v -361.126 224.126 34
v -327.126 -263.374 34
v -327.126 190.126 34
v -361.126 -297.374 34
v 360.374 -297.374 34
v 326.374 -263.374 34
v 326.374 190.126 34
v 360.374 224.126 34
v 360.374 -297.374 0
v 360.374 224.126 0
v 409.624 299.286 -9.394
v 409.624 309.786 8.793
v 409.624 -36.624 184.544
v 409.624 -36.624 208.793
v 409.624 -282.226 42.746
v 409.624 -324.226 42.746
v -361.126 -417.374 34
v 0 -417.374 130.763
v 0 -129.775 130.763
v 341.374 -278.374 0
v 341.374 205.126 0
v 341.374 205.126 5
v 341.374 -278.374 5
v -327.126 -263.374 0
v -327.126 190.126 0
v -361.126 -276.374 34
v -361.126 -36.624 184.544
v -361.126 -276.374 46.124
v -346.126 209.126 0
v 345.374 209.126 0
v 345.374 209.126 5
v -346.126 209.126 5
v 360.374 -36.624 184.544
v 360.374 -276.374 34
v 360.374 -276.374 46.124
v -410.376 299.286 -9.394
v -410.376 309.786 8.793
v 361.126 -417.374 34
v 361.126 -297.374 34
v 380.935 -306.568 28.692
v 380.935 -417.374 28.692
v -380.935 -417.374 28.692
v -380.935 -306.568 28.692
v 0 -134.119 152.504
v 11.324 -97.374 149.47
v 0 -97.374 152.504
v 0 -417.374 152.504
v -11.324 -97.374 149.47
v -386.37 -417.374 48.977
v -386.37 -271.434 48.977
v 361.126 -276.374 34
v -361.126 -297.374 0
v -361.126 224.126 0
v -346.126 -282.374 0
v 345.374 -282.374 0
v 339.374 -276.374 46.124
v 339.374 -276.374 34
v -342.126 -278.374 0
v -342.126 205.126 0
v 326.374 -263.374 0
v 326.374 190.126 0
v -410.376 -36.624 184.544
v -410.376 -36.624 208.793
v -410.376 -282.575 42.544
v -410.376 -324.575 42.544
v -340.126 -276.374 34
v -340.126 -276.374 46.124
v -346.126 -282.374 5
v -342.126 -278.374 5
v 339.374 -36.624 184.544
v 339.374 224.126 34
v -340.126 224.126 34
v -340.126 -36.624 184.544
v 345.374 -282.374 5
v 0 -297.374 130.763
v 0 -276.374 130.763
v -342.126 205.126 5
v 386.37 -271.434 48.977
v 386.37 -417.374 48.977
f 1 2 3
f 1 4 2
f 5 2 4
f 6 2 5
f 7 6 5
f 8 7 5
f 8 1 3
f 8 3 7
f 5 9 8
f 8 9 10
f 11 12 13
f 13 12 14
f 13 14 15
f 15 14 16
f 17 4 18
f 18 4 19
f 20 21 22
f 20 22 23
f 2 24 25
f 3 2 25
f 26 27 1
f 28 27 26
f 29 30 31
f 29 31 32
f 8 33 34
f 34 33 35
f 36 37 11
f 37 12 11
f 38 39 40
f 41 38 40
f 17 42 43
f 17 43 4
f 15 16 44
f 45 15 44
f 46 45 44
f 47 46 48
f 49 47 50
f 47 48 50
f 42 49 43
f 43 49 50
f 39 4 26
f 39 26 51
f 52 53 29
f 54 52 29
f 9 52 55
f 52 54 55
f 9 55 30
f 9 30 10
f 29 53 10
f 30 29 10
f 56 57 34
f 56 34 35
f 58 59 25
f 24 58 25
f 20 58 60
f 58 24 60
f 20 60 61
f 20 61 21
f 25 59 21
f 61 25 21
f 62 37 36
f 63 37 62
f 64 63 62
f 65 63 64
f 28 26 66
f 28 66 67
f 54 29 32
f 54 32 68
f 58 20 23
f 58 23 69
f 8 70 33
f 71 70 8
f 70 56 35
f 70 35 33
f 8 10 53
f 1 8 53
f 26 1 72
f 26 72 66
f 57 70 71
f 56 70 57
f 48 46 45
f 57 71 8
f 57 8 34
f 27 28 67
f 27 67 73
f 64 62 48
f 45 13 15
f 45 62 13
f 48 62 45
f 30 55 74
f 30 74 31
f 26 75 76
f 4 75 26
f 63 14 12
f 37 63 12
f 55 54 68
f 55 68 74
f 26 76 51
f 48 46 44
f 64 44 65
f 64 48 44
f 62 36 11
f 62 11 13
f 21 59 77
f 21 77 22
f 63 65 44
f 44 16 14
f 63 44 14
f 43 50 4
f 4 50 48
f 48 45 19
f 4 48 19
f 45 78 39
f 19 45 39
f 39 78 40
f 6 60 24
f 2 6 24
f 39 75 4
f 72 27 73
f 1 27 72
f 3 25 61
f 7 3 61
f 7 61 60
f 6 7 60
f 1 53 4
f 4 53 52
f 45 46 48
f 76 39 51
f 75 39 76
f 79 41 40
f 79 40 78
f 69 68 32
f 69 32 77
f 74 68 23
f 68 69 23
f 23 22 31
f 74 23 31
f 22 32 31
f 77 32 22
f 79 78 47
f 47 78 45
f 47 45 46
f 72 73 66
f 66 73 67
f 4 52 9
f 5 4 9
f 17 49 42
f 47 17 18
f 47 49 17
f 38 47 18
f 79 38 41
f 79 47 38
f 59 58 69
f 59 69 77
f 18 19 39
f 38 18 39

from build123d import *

# Parameters (mm, degrees)
F1_DEPTH       = 34
F3_DEPTH       = 770.75
F3_DEPTH_BACK  = 49.25
F4_DEPTH       = 21
F5_START       = -700.5
F5_DEPTH       = 21
F6_DEPTH       = 5
F8_DEPTH       = 21
F7_W           = 721.5
F7_H           = 34
F9_DEPTH       = 200
F9_DEPTH_BACK  = 50
F10_W          = 820
F10_H          = 41.1768076986
F11_DEPTH      = 50
F11_TAPER      = -3
F12_DEPTH      = 200
F12_DEPTH_BACK = 120
F14_DEPTH      = 300
F16_DEPTH      = 800


with BuildPart() as f1:
    # F0 (on Top) → F1 (new body)
    with BuildSketch(Plane.XY):
        Polygon((345.3741043846, -282.3741084489), (360.3741043846, -297.3741084489), (360.3741043846, 224.1258915511), (345.3741043846, 209.1258915511), align=None)
        Polygon((326.3741043846, -263.3741084489), (341.3741043846, -278.3741084489), (341.3741043846, 205.1258915511), (326.3741043846, 190.1258915511), align=None)
        Polygon((-346.1258956154, -282.3741084489), (-361.1258956154, -297.3741084489), (360.3741043846, -297.3741084489), (345.3741043846, -282.3741084489), align=None)
        Polygon((360.3741043846, 224.1258915511), (-361.1258956154, 224.1258915511), (-346.1258956154, 209.1258915511), (345.3741043846, 209.1258915511), align=None)
        Polygon((-361.1258956154, 224.1258915511), (-361.1258956154, -297.3741084489), (-346.1258956154, -282.3741084489), (-346.1258956154, 209.1258915511), align=None)
        Polygon((-327.1258956154, -263.3741084489), (-342.1258956154, -278.3741084489), (341.3741043846, -278.3741084489), (326.3741043846, -263.3741084489), align=None)
        Polygon((-342.1258956154, 205.1258915511), (-342.1258956154, -278.3741084489), (-327.1258956154, -263.3741084489), (-327.1258956154, 190.1258915511), align=None)
        Polygon((341.3741043846, 205.1258915511), (-342.1258956154, 205.1258915511), (-327.1258956154, 190.1258915511), (326.3741043846, 190.1258915511), align=None)
        Polygon((341.3741043846, -278.3741084489), (345.3741043846, -282.3741084489), (345.3741043846, 209.1258915511), (341.3741043846, 205.1258915511), align=None)
        Polygon((-342.1258956154, -278.3741084489), (-346.1258956154, -282.3741084489), (345.3741043846, -282.3741084489), (341.3741043846, -278.3741084489), align=None)
        Polygon((-346.1258956154, 209.1258915511), (-346.1258956154, -282.3741084489), (-342.1258956154, -278.3741084489), (-342.1258956154, 205.1258915511), align=None)
        Polygon((345.3741043846, 209.1258915511), (-346.1258956154, 209.1258915511), (-342.1258956154, 205.1258915511), (341.3741043846, 205.1258915511), align=None)
    extrude(amount=F1_DEPTH)

    # F0 (on Top) → F6 (cut)
    with BuildSketch(Plane.XY):
        Polygon((345.3741043846, 209.1258915511), (-346.1258956154, 209.1258915511), (-342.1258956154, 205.1258915511), (341.3741043846, 205.1258915511), align=None)
        Polygon((-346.1258956154, 209.1258915511), (-346.1258956154, -282.3741084489), (-342.1258956154, -278.3741084489), (-342.1258956154, 205.1258915511), align=None)
        Polygon((-342.1258956154, -278.3741084489), (-346.1258956154, -282.3741084489), (345.3741043846, -282.3741084489), (341.3741043846, -278.3741084489), align=None)
        Polygon((341.3741043846, -278.3741084489), (345.3741043846, -282.3741084489), (345.3741043846, 209.1258915511), (341.3741043846, 205.1258915511), align=None)
    extrude(amount=F6_DEPTH, mode=Mode.SUBTRACT)


with BuildPart() as f3:
    # F2 (on face) → F3 (new body, two sides)
    with BuildSketch(Plane(origin=(-361.1258956154, 0, 0), x_dir=(0, -1, 0), z_dir=(-1, 0, 0))) as f3_sk:
        Polygon((-224.1258915511, 34), (36.6241084489, 184.5440826912), (36.6241084489, 208.7927939972), (-309.7860530649, 8.7927939972), (-299.2860530649, -9.3937394823), align=None)
        Polygon((36.6241084489, 208.7927939972), (36.6241084489, 184.5440826912), (276.3741084489, 46.124355653), (297.3741084489, 34), (372.5342699626, -9.3937394823), (383.0342699626, 8.7927939972), align=None)
    extrude(amount=-F3_DEPTH)
    extrude(f3_sk.sketch, amount=F3_DEPTH_BACK)

    # F7 (on face) → F9 (cut, two sides)
    with BuildSketch(Plane.XZ.offset(297.3741084489)) as f9_sk:
        Polygon((-361.1258956154, 0), (-361.1258956154, 34), (-380.9351305685, 28.6921314917), (-386.3703305156, 48.9765738437), (-569.1533924811, 0), align=None)
        Polygon((-380.9351305685, 28.6921314917), (-361.1258956154, 34), (0, 130.7633920961), (0, 152.5041918847), (-386.3703305156, 48.9765738437), align=None)
        Polygon((361.1258956154, 34), (360.3741043846, 34), (360.3741043846, 0), (569.1533924811, 0), (386.3703305156, 48.9765738437), (380.9351305685, 28.6921314917), align=None)
        Polygon((0, 152.5041918847), (0, 130.7633920961), (361.1258956154, 34), (380.9351305685, 28.6921314917), (386.3703305156, 48.9765738437), align=None)
        Polygon((0, 130.7633920961), (-361.1258956154, 34), (360.3741043846, 34), (361.1258956154, 34), align=None)
        with Locations((-0.3758956154, 17)):
            Rectangle(F7_W, F7_H)
    extrude(amount=-F9_DEPTH, mode=Mode.SUBTRACT)
    extrude(f9_sk.sketch, amount=F9_DEPTH_BACK, mode=Mode.SUBTRACT)

    # F10 (on face) → F11 (cut)
    with BuildSketch(Plane(origin=(0, -99.5659589765, 172.4532996517), x_dir=(1, 0, 0), z_dir=(0, -0.5, 0.8660254038))):
        Polygon((409.6241043846, -259.4151114743), (0, -39.8982155339), (-410.3758956154, -259.8179951806), (-612.6573998522, -368.2203265886), (612.6573998522, -368.2203265886), align=None)
        with Locations((-0.3758956154, -306.7326074598)):
            Rectangle(F10_W, F10_H, mode=Mode.SUBTRACT)
        with Locations((-0.3758956154, -306.7326074598)):
            Rectangle(F10_W, F10_H)
    extrude(amount=-F11_DEPTH, taper=F11_TAPER, mode=Mode.SUBTRACT)


with BuildPart() as f4:
    # F2 (on face) → F4 (new body)
    with BuildSketch(Plane(origin=(-361.1258956154, 0, 0), x_dir=(0, -1, 0), z_dir=(-1, 0, 0))):
        Polygon((-203.1258915511, 34), (36.6241084489, 34), (36.6241084489, 184.5440826912), (-224.1258915511, 34), align=None)
        Polygon((36.6241084489, 184.5440826912), (36.6241084489, 34), (276.3741084489, 34), (276.3741084489, 46.124355653), align=None)
    extrude(amount=-F4_DEPTH)


with BuildPart() as f5:
    # F2 (on face) → F5 (new body)
    with BuildSketch(Plane(origin=(-361.1258956154, 0, 0), x_dir=(0, -1, 0), z_dir=(-1, 0, 0)).offset(F5_START)):
        Polygon((-203.1258915511, 34), (36.6241084489, 34), (36.6241084489, 184.5440826912), (-224.1258915511, 34), align=None)
        Polygon((36.6241084489, 184.5440826912), (36.6241084489, 34), (276.3741084489, 34), (276.3741084489, 46.124355653), align=None)
    extrude(amount=-F5_DEPTH)


with BuildPart() as f8:
    # F7 (on face) → F8 (new body)
    with BuildSketch(Plane.XZ.offset(297.3741084489)):
        Polygon((0, 130.7633920961), (-361.1258956154, 34), (360.3741043846, 34), (361.1258956154, 34), align=None)
    extrude(amount=-F8_DEPTH)


with BuildPart() as f12:
    # F7 (on face) → F12 (new body, two sides)
    with BuildSketch(Plane.XZ.offset(297.3741084489)) as f12_sk:
        Polygon((0, 152.5041918847), (0, 130.7633920961), (361.1258956154, 34), (380.9351305685, 28.6921314917), (386.3703305156, 48.9765738437), align=None)
        Polygon((-380.9351305685, 28.6921314917), (-361.1258956154, 34), (0, 130.7633920961), (0, 152.5041918847), (-386.3703305156, 48.9765738437), align=None)
    extrude(amount=-F12_DEPTH)
    extrude(f12_sk.sketch, amount=F12_DEPTH_BACK)

    # F13 (on face) → F14 (cut)
    with BuildSketch(Plane(origin=(0, -89.0659589765, 154.2667661722), x_dir=(1, 0, 0), z_dir=(0, 0.5, -0.8660254038))):
        Polygon((-410.3758956154, -60.5546330379), (409.6241043846, -60.5546330379), (409.6241043846, 223.0420445153), (11.3235573479, 9.5934246686), (-11.3235573479, 9.5934246686), (-410.3758956154, 223.4449282217), align=None)
    extrude(amount=F14_DEPTH, mode=Mode.SUBTRACT)

    # F15 (on face) → F16 (cut)
    with BuildSketch(Plane.YZ.offset(409.6241043846)):
        Polygon((-24.5864332149, 127.3517449025), (-52.3608607368, 175.4584645216), (-282.2260356388, 42.7457439146), (-409.6211082826, -30.8058355697), (-403.7217834932, -91.54215164), align=None)
    extrude(amount=-F16_DEPTH, mode=Mode.SUBTRACT)


solid = Compound([f1.part, f3.part, f4.part, f5.part, f8.part, f12.part])
